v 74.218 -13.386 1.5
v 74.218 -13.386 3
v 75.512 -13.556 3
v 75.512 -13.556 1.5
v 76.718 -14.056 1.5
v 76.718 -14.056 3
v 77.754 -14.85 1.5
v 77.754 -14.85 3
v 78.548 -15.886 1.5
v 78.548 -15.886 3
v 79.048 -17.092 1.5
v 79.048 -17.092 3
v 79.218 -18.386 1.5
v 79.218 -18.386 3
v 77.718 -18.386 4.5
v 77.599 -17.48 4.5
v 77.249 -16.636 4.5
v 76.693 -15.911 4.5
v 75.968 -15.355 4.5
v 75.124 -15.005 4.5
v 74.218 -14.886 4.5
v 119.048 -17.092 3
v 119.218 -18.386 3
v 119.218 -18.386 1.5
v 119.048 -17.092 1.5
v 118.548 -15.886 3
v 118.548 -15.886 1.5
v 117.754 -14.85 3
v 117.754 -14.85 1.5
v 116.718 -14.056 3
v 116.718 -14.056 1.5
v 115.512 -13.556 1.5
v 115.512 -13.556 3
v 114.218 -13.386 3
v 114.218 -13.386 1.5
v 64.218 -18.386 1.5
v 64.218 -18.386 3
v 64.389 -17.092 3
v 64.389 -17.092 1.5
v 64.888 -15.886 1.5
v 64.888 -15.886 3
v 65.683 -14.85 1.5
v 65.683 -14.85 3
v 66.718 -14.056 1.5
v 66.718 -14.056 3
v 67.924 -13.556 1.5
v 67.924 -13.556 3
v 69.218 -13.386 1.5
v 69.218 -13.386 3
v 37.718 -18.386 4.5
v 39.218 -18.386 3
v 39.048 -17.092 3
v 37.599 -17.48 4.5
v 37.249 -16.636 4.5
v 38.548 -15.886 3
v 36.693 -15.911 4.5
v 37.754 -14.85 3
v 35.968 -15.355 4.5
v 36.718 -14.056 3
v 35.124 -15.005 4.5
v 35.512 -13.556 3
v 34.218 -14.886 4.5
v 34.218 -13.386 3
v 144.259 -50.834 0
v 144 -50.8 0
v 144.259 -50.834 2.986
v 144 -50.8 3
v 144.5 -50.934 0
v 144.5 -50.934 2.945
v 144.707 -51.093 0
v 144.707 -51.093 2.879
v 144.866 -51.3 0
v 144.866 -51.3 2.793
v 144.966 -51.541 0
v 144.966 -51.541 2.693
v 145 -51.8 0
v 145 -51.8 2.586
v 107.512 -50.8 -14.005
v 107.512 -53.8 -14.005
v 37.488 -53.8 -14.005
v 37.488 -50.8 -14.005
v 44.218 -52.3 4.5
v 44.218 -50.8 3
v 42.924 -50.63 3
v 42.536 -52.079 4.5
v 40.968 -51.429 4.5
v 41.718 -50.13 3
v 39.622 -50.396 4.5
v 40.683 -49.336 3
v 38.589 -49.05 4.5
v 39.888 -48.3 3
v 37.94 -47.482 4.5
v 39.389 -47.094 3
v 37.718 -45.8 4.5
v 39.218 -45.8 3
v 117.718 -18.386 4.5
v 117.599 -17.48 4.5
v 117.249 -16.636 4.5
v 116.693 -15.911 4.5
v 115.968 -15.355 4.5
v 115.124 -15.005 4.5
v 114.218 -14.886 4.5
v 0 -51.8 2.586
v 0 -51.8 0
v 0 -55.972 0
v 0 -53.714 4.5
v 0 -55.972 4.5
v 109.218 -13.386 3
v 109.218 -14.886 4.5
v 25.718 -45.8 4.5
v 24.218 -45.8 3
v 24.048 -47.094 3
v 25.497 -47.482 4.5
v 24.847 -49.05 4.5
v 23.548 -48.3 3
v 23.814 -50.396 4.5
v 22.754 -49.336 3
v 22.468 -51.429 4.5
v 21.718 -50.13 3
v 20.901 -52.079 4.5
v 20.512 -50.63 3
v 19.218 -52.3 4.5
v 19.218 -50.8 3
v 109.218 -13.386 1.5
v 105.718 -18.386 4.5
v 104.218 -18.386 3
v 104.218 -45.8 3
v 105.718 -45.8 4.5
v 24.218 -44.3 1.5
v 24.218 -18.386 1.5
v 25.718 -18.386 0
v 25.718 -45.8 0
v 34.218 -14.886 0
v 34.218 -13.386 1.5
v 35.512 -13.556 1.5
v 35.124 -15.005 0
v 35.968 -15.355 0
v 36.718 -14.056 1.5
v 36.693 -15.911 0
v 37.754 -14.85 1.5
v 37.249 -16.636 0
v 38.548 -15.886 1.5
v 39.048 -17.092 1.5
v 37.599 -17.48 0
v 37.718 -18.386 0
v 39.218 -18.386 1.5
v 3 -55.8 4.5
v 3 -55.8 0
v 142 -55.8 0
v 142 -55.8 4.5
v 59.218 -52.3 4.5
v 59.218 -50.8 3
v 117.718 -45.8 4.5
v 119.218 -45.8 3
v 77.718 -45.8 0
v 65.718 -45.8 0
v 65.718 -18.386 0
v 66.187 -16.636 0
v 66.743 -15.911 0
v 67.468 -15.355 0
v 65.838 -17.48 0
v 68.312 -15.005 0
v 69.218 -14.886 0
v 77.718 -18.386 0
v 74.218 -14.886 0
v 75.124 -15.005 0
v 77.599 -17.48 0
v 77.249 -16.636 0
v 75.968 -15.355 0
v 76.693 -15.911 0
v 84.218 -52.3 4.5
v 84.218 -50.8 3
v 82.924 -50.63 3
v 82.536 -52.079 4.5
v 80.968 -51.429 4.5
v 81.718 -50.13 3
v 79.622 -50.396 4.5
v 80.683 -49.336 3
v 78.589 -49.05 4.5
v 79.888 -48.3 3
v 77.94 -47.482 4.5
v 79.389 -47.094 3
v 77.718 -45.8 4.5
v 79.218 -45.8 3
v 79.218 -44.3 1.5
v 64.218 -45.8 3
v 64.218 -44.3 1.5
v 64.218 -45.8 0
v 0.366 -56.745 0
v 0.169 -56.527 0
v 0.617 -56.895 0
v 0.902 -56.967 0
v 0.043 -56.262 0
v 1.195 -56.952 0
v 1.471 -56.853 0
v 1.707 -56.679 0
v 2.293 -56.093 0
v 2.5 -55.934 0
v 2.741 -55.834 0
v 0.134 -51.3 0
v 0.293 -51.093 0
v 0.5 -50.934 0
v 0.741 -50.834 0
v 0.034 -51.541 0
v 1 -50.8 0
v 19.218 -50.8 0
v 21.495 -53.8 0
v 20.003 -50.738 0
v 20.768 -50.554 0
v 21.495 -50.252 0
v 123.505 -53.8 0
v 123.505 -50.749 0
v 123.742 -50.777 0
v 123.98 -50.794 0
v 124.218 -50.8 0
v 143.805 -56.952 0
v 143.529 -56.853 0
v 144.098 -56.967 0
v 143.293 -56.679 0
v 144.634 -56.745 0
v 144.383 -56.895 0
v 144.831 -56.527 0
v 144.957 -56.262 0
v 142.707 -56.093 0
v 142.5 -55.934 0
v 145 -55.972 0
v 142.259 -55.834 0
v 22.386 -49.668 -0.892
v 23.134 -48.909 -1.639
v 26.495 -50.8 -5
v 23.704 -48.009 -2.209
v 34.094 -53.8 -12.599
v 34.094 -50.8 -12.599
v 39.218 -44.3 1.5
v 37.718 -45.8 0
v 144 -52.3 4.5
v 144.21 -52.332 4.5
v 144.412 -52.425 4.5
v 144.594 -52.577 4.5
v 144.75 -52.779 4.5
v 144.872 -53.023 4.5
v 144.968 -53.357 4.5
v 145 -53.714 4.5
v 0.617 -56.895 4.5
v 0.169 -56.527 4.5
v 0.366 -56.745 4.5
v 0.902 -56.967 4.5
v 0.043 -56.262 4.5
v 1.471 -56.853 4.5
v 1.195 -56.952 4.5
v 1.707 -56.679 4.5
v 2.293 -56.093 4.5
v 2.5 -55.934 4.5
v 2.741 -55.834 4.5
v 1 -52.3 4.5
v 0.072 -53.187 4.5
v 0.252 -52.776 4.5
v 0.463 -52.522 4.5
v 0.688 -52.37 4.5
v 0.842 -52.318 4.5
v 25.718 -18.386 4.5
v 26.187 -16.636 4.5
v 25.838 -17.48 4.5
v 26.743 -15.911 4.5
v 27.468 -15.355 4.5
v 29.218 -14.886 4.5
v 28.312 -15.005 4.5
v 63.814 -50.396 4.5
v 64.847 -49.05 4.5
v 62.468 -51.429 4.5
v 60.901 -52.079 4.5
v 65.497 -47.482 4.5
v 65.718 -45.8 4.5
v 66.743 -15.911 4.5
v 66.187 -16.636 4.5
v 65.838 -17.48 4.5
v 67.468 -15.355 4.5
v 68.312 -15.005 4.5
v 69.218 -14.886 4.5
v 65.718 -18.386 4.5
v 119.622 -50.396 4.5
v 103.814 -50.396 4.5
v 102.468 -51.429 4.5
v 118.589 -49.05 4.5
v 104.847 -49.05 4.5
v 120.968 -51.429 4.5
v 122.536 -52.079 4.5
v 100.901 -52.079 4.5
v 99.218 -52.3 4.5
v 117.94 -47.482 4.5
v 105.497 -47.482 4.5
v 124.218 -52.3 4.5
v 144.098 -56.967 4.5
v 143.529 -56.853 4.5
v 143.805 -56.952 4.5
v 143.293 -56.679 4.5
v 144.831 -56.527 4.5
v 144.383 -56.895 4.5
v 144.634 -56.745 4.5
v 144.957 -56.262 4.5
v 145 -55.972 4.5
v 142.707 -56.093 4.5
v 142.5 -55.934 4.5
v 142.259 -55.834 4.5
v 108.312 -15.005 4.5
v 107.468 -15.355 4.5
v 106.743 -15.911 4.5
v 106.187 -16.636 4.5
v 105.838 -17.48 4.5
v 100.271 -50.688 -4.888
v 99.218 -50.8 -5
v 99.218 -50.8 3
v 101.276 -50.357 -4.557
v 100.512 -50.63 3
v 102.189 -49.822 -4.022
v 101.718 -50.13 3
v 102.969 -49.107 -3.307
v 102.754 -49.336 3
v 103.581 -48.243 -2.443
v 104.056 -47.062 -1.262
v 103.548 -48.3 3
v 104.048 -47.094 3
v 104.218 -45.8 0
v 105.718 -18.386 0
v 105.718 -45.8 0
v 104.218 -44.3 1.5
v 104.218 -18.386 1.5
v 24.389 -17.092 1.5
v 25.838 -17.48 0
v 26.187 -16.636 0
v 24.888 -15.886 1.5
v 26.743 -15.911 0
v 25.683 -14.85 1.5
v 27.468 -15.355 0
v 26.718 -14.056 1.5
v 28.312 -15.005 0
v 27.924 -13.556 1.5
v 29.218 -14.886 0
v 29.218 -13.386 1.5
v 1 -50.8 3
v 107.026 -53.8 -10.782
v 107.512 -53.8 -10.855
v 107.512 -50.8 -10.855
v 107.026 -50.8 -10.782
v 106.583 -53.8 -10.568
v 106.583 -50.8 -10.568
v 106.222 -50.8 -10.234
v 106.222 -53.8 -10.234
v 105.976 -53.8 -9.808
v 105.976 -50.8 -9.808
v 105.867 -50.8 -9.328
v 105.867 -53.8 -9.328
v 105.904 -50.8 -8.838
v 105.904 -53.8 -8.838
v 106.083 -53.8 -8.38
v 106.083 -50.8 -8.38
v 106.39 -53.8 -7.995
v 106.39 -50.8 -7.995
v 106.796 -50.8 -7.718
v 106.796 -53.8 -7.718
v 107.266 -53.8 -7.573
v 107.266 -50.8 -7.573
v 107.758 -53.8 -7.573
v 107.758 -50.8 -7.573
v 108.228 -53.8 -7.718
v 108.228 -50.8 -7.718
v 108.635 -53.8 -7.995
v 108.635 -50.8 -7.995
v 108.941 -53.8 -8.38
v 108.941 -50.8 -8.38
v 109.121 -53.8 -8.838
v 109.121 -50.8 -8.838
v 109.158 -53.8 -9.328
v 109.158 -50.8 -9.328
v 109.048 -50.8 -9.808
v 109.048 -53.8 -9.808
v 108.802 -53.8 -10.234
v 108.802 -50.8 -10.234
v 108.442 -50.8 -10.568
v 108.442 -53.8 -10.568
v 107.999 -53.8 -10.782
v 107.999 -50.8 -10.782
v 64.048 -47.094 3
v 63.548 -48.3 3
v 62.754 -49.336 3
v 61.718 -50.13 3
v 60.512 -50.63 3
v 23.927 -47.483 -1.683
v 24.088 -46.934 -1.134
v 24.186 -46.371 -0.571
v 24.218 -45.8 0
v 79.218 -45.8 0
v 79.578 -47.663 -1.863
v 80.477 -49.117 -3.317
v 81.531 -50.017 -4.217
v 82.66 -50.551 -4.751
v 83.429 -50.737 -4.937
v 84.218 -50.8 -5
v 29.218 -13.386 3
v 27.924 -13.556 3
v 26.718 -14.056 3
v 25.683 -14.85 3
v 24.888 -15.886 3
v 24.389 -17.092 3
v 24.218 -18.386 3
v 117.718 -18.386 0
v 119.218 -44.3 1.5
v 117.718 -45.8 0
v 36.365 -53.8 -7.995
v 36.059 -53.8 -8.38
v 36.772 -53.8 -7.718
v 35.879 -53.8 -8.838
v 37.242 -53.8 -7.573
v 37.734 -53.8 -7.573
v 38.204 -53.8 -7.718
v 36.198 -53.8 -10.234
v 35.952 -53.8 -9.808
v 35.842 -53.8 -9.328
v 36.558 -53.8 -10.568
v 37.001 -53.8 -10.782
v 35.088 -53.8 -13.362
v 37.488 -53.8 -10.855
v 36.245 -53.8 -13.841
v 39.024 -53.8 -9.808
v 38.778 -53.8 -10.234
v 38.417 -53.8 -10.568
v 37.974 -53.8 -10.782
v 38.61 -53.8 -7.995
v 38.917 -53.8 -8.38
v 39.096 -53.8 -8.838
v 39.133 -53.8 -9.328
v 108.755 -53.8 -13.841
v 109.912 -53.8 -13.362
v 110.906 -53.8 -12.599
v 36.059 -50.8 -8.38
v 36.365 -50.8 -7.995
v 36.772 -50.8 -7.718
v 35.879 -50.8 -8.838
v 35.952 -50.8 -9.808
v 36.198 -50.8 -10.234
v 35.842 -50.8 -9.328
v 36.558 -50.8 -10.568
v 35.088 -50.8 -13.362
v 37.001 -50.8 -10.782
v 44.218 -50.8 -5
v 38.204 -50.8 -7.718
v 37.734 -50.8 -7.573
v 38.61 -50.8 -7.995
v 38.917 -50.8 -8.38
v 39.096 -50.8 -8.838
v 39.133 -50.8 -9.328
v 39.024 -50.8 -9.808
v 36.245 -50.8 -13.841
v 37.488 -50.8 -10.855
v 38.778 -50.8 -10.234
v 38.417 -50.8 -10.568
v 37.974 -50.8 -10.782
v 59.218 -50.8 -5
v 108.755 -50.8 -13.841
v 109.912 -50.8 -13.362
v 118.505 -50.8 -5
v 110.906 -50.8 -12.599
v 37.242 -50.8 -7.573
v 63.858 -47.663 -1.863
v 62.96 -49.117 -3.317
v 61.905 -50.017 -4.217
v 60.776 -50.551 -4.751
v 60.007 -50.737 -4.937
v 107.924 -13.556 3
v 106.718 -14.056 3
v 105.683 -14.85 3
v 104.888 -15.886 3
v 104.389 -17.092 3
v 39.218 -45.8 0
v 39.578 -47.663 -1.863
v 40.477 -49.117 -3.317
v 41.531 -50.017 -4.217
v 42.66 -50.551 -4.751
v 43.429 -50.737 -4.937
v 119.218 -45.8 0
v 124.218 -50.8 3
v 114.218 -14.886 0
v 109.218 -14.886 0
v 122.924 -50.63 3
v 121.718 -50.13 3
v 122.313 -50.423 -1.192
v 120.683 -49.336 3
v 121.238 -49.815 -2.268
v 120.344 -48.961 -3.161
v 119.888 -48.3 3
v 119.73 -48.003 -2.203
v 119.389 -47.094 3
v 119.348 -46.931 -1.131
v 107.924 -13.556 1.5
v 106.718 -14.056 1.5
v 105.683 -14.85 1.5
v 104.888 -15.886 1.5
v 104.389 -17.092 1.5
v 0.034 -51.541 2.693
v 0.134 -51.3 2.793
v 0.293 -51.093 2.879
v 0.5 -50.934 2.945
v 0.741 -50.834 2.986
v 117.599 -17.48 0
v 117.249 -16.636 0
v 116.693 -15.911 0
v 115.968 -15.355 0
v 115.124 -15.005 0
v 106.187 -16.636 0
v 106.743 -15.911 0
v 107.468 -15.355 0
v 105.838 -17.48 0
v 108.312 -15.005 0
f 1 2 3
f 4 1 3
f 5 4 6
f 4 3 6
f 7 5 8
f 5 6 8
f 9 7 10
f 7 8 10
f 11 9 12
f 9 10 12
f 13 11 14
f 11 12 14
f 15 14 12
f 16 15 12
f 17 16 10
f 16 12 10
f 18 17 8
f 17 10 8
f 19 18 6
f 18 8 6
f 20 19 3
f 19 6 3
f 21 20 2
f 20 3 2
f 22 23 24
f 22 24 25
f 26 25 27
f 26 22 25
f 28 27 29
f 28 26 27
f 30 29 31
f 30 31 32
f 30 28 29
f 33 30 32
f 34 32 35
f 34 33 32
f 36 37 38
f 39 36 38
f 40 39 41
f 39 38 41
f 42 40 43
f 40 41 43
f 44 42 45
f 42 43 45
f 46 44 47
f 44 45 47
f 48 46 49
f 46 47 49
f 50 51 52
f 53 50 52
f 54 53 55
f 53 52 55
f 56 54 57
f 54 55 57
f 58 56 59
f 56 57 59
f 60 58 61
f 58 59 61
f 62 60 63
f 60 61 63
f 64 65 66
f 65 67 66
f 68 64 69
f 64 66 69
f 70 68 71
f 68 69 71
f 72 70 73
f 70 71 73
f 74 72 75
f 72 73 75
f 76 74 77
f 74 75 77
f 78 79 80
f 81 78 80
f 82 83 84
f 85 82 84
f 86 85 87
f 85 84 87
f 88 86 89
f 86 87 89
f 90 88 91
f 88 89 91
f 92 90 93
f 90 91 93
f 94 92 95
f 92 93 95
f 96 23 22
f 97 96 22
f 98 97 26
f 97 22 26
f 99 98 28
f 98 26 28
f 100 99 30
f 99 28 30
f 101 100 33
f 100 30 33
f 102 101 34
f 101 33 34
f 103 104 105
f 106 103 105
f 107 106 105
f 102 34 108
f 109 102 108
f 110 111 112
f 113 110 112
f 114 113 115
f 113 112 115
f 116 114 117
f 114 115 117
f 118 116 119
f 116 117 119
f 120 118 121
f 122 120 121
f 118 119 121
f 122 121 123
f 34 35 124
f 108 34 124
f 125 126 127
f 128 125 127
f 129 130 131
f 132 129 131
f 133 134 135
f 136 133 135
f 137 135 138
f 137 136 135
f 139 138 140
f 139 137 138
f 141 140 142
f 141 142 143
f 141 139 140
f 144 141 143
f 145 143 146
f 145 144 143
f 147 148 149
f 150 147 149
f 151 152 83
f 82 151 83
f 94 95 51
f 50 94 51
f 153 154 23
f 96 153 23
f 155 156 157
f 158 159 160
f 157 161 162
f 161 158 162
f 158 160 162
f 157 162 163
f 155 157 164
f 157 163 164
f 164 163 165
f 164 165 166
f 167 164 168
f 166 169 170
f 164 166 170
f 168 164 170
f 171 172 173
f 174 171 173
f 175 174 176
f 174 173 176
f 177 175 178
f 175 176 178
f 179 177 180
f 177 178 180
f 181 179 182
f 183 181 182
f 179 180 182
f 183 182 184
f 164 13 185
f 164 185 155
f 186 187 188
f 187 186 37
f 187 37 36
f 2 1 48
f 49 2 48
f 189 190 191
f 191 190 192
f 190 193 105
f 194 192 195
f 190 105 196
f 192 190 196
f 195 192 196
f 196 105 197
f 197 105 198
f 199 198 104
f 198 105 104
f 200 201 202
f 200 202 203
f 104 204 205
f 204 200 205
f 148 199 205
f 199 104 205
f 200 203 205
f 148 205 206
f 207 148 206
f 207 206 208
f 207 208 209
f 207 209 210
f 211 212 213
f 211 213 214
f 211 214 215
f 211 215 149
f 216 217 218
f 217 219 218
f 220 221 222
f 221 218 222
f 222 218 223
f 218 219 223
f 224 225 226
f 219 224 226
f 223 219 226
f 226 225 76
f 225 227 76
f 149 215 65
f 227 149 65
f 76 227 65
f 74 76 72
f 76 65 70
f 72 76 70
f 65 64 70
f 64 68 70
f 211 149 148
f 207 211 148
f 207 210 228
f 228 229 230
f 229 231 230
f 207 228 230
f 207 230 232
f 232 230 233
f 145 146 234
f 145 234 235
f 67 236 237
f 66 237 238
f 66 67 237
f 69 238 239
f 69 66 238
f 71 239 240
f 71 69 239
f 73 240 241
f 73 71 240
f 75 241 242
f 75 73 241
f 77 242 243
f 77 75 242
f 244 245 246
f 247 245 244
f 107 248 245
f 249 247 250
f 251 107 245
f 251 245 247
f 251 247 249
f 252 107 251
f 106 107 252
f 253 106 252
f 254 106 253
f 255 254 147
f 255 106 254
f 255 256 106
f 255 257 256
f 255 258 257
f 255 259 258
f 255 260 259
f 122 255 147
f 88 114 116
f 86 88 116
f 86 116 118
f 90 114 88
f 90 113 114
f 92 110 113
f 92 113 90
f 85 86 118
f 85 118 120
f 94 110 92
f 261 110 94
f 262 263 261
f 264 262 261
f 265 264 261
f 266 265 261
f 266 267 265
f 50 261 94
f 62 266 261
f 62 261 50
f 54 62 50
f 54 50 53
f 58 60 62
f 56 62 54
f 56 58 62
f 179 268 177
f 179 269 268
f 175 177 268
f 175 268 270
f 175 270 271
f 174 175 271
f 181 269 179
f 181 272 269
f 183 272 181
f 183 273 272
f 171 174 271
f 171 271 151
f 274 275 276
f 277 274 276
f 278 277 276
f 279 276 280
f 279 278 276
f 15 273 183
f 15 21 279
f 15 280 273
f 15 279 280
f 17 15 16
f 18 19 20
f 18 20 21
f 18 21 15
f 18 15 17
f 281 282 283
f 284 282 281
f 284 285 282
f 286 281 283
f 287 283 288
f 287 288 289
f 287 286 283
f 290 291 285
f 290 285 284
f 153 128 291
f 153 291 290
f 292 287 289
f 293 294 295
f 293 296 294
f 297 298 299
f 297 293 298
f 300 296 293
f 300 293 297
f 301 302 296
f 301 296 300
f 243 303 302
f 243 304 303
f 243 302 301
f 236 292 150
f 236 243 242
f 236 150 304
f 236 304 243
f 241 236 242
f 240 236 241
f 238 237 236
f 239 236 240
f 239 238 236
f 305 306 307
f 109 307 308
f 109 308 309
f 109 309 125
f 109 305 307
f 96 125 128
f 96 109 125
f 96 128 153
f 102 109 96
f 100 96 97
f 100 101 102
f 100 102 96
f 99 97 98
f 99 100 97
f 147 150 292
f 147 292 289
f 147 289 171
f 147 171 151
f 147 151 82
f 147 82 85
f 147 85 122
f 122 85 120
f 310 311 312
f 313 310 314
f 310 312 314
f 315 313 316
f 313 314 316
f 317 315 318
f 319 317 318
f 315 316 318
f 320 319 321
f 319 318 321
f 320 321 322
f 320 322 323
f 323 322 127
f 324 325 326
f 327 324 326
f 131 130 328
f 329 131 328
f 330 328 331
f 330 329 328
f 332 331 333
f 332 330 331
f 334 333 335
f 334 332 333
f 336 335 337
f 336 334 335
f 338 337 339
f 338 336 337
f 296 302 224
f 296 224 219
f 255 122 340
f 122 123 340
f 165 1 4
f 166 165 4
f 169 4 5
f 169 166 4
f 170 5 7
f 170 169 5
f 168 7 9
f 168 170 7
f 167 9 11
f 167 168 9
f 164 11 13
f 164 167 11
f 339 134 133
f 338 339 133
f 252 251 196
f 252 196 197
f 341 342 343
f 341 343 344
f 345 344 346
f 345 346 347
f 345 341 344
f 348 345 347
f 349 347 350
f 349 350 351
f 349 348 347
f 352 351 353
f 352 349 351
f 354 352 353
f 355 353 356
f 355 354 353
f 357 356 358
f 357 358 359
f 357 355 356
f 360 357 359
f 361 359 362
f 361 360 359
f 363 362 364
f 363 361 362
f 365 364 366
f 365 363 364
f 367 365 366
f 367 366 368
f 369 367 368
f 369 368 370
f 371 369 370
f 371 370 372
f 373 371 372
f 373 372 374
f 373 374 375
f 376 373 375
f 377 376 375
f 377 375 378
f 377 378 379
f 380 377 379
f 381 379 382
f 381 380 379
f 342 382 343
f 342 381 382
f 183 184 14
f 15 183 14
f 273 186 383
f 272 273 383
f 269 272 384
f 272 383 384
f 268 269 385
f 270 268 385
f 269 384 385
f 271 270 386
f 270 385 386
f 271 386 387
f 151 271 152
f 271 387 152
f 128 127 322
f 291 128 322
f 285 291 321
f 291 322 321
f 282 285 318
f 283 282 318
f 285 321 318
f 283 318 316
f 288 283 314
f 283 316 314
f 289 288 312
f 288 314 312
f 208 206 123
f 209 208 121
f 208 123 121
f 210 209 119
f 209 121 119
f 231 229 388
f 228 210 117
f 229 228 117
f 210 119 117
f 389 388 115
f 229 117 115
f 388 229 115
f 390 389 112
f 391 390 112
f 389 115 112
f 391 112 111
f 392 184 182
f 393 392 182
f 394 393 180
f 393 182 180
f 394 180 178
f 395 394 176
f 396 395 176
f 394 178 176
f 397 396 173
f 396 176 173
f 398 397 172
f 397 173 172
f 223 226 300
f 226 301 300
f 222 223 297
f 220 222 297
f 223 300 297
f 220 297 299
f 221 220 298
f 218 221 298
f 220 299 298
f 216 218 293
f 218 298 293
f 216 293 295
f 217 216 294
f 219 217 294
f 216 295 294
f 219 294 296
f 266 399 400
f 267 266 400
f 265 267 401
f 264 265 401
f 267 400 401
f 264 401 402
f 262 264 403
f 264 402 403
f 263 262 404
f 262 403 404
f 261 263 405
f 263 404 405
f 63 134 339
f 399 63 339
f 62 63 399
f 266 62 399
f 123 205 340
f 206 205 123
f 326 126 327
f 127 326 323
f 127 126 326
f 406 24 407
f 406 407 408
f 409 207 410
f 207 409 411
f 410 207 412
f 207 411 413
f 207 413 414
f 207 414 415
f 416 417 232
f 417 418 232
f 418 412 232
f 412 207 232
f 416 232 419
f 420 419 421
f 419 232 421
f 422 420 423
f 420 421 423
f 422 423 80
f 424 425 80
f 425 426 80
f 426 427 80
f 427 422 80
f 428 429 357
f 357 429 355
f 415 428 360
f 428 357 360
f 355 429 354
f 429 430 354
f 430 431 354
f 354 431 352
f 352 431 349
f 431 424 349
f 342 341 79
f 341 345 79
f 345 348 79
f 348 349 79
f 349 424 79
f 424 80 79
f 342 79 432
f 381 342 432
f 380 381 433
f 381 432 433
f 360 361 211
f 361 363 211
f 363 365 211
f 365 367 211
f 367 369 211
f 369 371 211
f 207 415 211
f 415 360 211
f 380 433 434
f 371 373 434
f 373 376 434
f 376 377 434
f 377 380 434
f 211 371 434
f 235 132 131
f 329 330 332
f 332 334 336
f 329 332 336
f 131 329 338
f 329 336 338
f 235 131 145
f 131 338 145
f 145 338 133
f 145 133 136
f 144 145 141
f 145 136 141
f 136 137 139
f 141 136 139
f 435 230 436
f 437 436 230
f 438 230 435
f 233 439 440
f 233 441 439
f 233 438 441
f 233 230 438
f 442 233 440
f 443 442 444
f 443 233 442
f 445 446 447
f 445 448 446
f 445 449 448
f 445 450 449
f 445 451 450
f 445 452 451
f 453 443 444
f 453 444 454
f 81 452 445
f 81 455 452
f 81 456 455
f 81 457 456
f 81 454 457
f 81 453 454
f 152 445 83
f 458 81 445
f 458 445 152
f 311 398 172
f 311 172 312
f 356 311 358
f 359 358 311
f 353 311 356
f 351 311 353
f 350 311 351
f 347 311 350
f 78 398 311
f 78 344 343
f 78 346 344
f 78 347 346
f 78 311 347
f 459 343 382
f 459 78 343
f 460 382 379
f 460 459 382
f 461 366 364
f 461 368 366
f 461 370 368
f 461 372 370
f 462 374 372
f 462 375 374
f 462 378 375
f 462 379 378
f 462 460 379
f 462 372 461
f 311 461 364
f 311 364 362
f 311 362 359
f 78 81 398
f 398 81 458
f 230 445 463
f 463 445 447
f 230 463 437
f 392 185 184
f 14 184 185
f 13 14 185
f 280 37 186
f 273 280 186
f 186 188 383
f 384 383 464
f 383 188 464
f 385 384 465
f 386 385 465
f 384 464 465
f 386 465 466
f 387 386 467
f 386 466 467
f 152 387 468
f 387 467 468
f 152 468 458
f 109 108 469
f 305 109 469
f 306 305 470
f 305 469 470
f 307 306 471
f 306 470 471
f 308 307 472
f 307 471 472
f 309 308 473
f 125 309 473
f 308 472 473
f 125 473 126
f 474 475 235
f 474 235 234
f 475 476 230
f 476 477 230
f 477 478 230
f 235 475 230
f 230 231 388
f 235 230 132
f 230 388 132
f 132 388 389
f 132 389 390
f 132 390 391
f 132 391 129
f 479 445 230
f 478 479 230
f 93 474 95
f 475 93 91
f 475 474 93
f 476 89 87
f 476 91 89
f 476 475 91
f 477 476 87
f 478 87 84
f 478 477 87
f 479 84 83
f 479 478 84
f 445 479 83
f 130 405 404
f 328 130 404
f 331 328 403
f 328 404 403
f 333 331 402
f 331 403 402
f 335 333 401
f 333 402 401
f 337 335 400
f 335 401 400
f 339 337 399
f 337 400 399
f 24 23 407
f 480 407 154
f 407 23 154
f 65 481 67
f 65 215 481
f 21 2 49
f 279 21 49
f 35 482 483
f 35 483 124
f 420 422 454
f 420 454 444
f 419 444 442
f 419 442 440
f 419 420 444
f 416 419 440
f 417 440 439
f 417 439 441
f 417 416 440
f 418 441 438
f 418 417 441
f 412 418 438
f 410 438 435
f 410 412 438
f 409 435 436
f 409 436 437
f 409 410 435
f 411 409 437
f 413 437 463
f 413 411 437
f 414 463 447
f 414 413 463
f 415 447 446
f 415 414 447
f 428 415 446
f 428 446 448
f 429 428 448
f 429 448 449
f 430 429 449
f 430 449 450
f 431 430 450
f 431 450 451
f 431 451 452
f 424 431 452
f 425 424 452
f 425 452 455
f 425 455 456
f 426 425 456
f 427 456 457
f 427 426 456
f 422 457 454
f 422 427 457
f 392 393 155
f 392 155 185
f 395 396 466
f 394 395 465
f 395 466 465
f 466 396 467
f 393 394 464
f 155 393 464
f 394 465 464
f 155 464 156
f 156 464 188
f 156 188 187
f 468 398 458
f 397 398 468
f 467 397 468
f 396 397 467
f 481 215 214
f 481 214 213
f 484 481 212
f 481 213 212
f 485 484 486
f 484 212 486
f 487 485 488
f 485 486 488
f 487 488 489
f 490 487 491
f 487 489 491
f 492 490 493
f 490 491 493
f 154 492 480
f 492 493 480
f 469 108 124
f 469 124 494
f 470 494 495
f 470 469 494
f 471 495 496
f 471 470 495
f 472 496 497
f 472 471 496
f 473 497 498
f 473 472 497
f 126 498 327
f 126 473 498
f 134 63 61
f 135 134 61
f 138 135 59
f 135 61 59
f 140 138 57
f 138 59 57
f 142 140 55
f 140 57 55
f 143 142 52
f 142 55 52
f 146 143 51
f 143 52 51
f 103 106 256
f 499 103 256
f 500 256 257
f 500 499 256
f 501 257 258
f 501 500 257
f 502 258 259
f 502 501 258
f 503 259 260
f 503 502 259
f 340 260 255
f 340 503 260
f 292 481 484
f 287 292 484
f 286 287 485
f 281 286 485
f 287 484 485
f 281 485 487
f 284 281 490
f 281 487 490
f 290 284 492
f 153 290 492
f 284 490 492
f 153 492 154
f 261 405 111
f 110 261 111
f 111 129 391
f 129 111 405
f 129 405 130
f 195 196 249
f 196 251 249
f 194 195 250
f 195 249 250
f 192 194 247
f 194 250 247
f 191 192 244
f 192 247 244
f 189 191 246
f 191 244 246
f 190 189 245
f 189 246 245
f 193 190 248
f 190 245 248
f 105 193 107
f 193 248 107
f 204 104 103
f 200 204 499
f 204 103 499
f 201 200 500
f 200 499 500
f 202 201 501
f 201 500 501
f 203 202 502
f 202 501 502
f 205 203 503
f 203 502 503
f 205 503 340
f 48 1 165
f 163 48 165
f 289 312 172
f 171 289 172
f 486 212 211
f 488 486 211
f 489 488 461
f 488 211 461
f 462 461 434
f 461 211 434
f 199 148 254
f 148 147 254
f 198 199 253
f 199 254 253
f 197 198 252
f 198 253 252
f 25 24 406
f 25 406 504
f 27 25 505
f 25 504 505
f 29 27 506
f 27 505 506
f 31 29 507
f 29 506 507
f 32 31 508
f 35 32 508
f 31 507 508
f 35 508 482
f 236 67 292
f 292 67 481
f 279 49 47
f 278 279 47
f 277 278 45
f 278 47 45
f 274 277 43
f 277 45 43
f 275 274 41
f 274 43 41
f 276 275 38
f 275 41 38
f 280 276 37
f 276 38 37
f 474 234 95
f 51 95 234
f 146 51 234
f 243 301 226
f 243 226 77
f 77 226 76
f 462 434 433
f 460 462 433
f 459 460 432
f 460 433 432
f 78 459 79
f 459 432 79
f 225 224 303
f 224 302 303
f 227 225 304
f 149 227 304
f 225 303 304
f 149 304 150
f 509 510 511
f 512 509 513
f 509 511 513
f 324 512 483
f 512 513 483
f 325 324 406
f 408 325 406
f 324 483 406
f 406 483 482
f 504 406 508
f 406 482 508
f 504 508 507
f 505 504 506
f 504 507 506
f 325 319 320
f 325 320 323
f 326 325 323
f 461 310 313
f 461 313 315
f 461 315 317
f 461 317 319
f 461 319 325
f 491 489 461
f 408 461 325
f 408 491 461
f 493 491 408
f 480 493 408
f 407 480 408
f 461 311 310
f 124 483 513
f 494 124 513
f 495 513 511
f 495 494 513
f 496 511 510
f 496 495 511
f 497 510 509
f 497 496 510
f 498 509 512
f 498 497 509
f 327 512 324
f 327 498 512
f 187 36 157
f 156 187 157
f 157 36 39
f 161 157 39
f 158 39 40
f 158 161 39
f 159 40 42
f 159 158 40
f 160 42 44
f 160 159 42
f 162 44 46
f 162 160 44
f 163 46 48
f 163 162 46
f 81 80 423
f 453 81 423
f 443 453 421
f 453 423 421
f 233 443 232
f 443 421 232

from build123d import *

# Parameters (mm, degrees)
BOSS_EXTRUDE1_DEPTH = 4.5
SKETCH2_R           = 1.6500000000000021
BOSS_EXTRUDE2_DEPTH = 3
CHAMFER1_SIZE       = 5
FILLET1_R           = 5
FILLET2_R           = 5
CHAMFER2_SIZE       = 1.5
CHAMFER3_SIZE       = 1.5
FILLET3_R           = 1


with BuildPart() as part:
    # Sketch1 → Boss-Extrude1 (new body)
    with BuildSketch(Plane.XY):
        Polygon((119.21826692136499, -13.385786437626857), (104.21826692136499, -13.38578643762686), (104.21826692136499, -50.8), (79.218266921365, -50.8), (79.218266921365, -13.385786437626857), (64.218266921365, -13.38578643762686), (64.218266921365, -50.8), (39.218266921365, -50.8), (39.21826692136499, -13.385786437627136), (24.218266921364993, -13.38578643762714), (24.21826692136499, -50.8), (0, -50.79999999999999), (0, -58.38578643762687), (2.5857864376269135, -55.8), (142.4142135623731, -55.8), (145, -58.38578643762691), (145, -50.8), (119.21826692136499, -50.8), align=None)
    extrude(amount=BOSS_EXTRUDE1_DEPTH)

    # Sketch2 → Boss-Extrude2 (add)
    with BuildSketch(Plane(origin=(0, -53.8, 0), x_dir=(1, 0, 0), z_dir=(0, 1, 0))):
        with BuildLine():
            Line((123.50544023729859, 2.968e-14), (110.90639087969068, 12.59904935760797))
            ThreePointArc((110.90639087969068, 12.59904935760797), (109.34915880534766, 13.639558563966734), (107.5122783299952, 14.004936807912568))
            Line((107.5122783299952, 14.004936807912568), (37.48772167000479, 14.004936807912571))
            ThreePointArc((37.48772167000479, 14.004936807912571), (35.65084119465232, 13.639558563966755), (34.093609120309296, 12.599049357607985))
            Line((34.093609120309296, 12.599049357607985), (21.4945597627013, -1.69e-15))
            Line((21.4945597627013, -1.69e-15), (123.50544023729859, 2.968e-14))
        make_face()
        with Locations(Location((37.48772167000473, 9.204936807912581, 0), (0, 0, 90))):
            Circle(SKETCH2_R, mode=Mode.SUBTRACT)
        with Locations(Location((107.51227832999525, 9.204936807912581, 0), (0, 0, 90))):
            Circle(SKETCH2_R, mode=Mode.SUBTRACT)
    extrude(amount=BOSS_EXTRUDE2_DEPTH)

    # Chamfer1
    # the kernel refuses this chamfer: 5 mm, written as the material it adds along each edge
    with BuildSketch(Plane(origin=(24.218266921364993, -50.8, 8.6e-16), x_dir=(0, -0.02749587661059184, -0.9996219169112965), z_dir=(1, 0, -3.1e-16))) as chamfer1_piece_1_section:
        Polygon((CHAMFER1_SIZE * 0.999621916911, CHAMFER1_SIZE * 0.0274958766106), (-CHAMFER1_SIZE * 0.0274958766106, CHAMFER1_SIZE * 0.999621916911), (0, 0), align=None)
    chamfer1_piece_1 = extrude(amount=15.000000000000007, mode=Mode.PRIVATE)
    chamfer1_piece_1 = split(chamfer1_piece_1, bisect_by=Plane(origin=(27.458586857581327, -49.136179349739656, -5.964027094880023), z_dir=(0.7071067811865472, 0, 0.7071067811865478)), keep=Keep.TOP, mode=Mode.PRIVATE)
    add(chamfer1_piece_1)
    with BuildSketch(Plane(origin=(64.218266921365, -50.8, -1.145e-14), x_dir=(0, -0.02749587661058908, -0.9996219169112968), z_dir=(1, 0, -3.1e-16))) as chamfer1_piece_2:
        Polygon((CHAMFER1_SIZE * 0.999621916911, CHAMFER1_SIZE * 0.0274958766106), (-CHAMFER1_SIZE * 0.0274958766106, CHAMFER1_SIZE * 0.999621916911), (0, 0), align=None)
    extrude(amount=15)
    with BuildSketch(Plane(origin=(104.21826692136499, -50.8, -2.375e-14), x_dir=(0, 0.9996219169112965, 0.027495876610591035), z_dir=(1, 0, -3.1e-16))) as chamfer1_piece_3_section:
        Polygon((CHAMFER1_SIZE * 0.999621916911, -CHAMFER1_SIZE * 0.0274958766106), (-CHAMFER1_SIZE * 0.0274958766106, -CHAMFER1_SIZE * 0.999621916911), (0, 0), align=None)
    chamfer1_piece_3 = extrude(amount=15, mode=Mode.PRIVATE)
    chamfer1_piece_3 = split(chamfer1_piece_3, bisect_by=Plane(origin=(116.78603436653776, -49.14998540496001, -6.719405870760873), z_dir=(-0.7071067811865483, 0, 0.7071067811865467)), keep=Keep.TOP, mode=Mode.PRIVATE)
    add(chamfer1_piece_3)

    # Fillet1
    fillet1_edges = [part.edges().sort_by_distance(p)[0] for p in [
        (39.218266921365, -50.80000000000099, -0.24999999999926015),
        (64.218266921365, -50.80000000000099, -0.24999999999926015),
        (79.218266921365, -50.80000000000099, -0.24999999999926015),
        (104.218266921365, -50.799999999999, -0.24999999999926015),
        (119.21826692136499, -50.799999999999145, 0.10641334203299913),
        (24.218266921364997, -50.80000000000054, 0.8881464206679999),
    ]]
    fillet(fillet1_edges, radius=FILLET1_R)

    # Fillet2
    fillet2_edges = [part.edges().sort_by_distance(p)[0] for p in [
        (24.218266921364993, -13.38578643762714, 2.25),
        (39.21826692136499, -13.385786437627136, 2.25),
        (64.218266921365, -13.38578643762686, 2.25),
        (79.218266921365, -13.385786437626857, 2.25),
        (104.21826692136499, -13.38578643762686, 2.25),
        (119.21826692136499, -13.385786437626855, 2.25),
    ]]
    fillet(fillet2_edges, radius=FILLET2_R)

    # Chamfer2
    # the kernel refuses this chamfer: 1.5 mm, written as the material it takes off along each edge
    with BuildSketch(Plane(origin=(114.218266921365, -13.385786437626859, 0), x_dir=(0, -0.9996219169112968, -0.02749587661058636), z_dir=(-1, -2.4e-16, 0))) as chamfer2_piece_1:
        Polygon((CHAMFER2_SIZE * 0.999621916911, CHAMFER2_SIZE * 0.0274958766106), (-CHAMFER2_SIZE * 0.0274958766106, CHAMFER2_SIZE * 0.999621916911), (0, 0), align=None)
    extrude(amount=5, mode=Mode.SUBTRACT)
    with BuildSketch(Plane(origin=(119.218266921365, -49.65752448195035, 0), x_dir=(0.02749587661058217, 0, 0.9996219169112969), z_dir=(0, 1, 0))) as chamfer2_piece_2_section:
        Polygon((CHAMFER2_SIZE * 0.999621916911, -CHAMFER2_SIZE * 0.0274958766106), (-CHAMFER2_SIZE * 0.0274958766106, -CHAMFER2_SIZE * 0.999621916911), (0, 0), align=None)
    chamfer2_piece_2 = extrude(amount=31.27173804432349, mode=Mode.PRIVATE)
    chamfer2_piece_2 = split(chamfer2_piece_2, bisect_by=Plane(origin=(118.72073896252428, -38.57940955340098, 7.220590446608273), z_dir=(0, 0.7071067811868302, -0.7071067811862648)), keep=Keep.TOP, mode=Mode.PRIVATE)
    add(chamfer2_piece_2, mode=Mode.SUBTRACT)
    with BuildSketch(Plane(origin=(104.21826692136499, -18.38578643762686, 0), x_dir=(0.9996219169112968, 0, -0.02749587661058662), z_dir=(0, -1, 0))) as chamfer2_piece_3_section:
        Polygon((CHAMFER2_SIZE * 0.999621916911, CHAMFER2_SIZE * 0.0274958766106), (-CHAMFER2_SIZE * 0.0274958766106, CHAMFER2_SIZE * 0.999621916911), (0, 0), align=None)
    chamfer2_piece_3 = extrude(amount=31.27173804432348, mode=Mode.PRIVATE)
    chamfer2_piece_3 = split(chamfer2_piece_3, bisect_by=Plane(origin=(104.71579488020573, -38.579409553400986, 7.220590446608265), z_dir=(0, 0.7071067811868302, -0.7071067811862648)), keep=Keep.TOP, mode=Mode.PRIVATE)
    add(chamfer2_piece_3, mode=Mode.SUBTRACT)
    with BuildSketch(Plane(origin=(109.218266921365, -18.385786437626862, 0), x_dir=(0, 1, 0), z_dir=(1, 0, 0))) as chamfer2_piece_4:
        Polygon((5 - CHAMFER2_SIZE, 0), (5, CHAMFER2_SIZE), (5, 0), align=None)
    revolve(axis=Axis((109.218266921365, -18.385786437626862, 0), (0, 0, 1)), revolution_arc=90, mode=Mode.SUBTRACT)
    with BuildSketch(Plane(origin=(114.218266921365, -18.385786437626855, 0), x_dir=(1, 0, 0), z_dir=(0, -1, 0))) as chamfer2_piece_5:
        Polygon((5, CHAMFER2_SIZE), (5 - CHAMFER2_SIZE, 0), (5, 0), align=None)
    revolve(axis=Axis((114.218266921365, -18.385786437626855, 0), (0, 0, 1)), revolution_arc=90, mode=Mode.SUBTRACT)
    with BuildSketch(Plane(origin=(74.218266921365, -13.385786437626859, 0), x_dir=(0, 0.027495876610586778, 0.9996219169112968), z_dir=(-1, -2.4e-16, 0))) as chamfer2_piece_6:
        Polygon((CHAMFER2_SIZE * 0.999621916911, -CHAMFER2_SIZE * 0.0274958766106), (-CHAMFER2_SIZE * 0.0274958766106, -CHAMFER2_SIZE * 0.999621916911), (0, 0), align=None)
    extrude(amount=5, mode=Mode.SUBTRACT)
    with BuildSketch(Plane(origin=(79.218266921365, -49.65752448195035, 0), x_dir=(0.027495876610582157, 0, 0.9996219169112969), z_dir=(0, 1, 0))) as chamfer2_piece_7_section:
        Polygon((CHAMFER2_SIZE * 0.999621916911, -CHAMFER2_SIZE * 0.0274958766106), (-CHAMFER2_SIZE * 0.0274958766106, -CHAMFER2_SIZE * 0.999621916911), (0, 0), align=None)
    chamfer2_piece_7 = extrude(amount=31.27173804432349, mode=Mode.PRIVATE)
    chamfer2_piece_7 = split(chamfer2_piece_7, bisect_by=Plane(origin=(78.72073896252427, -38.579409553386625, 7.220590446607076), z_dir=(0, 0.7071067811862648, -0.7071067811868302)), keep=Keep.TOP, mode=Mode.PRIVATE)
    add(chamfer2_piece_7, mode=Mode.SUBTRACT)
    with BuildSketch(Plane(origin=(64.218266921365, -18.38578643762686, 0), x_dir=(-0.02749587661058215, 0, 0.9996219169112969), z_dir=(0, -1, 0))) as chamfer2_piece_8_section:
        Polygon((CHAMFER2_SIZE * 0.999621916911, -CHAMFER2_SIZE * 0.0274958766106), (-CHAMFER2_SIZE * 0.0274958766106, -CHAMFER2_SIZE * 0.999621916911), (0, 0), align=None)
    chamfer2_piece_8 = extrude(amount=31.27173804432348, mode=Mode.PRIVATE)
    chamfer2_piece_8 = split(chamfer2_piece_8, bisect_by=Plane(origin=(64.71579488020572, -38.57940955338663, 7.220590446607069), z_dir=(0, 0.7071067811862648, -0.7071067811868302)), keep=Keep.TOP, mode=Mode.PRIVATE)
    add(chamfer2_piece_8, mode=Mode.SUBTRACT)
    with BuildSketch(Plane(origin=(69.218266921365, -18.385786437626862, 0), x_dir=(-1, 0, 0), z_dir=(0, -1, 0))) as chamfer2_piece_9:
        Polygon((5, -CHAMFER2_SIZE), (5 - CHAMFER2_SIZE, 0), (5, 0), align=None)
    revolve(axis=Axis((69.218266921365, -18.385786437626862, 0), (0, 0, -1)), revolution_arc=90, mode=Mode.SUBTRACT)
    with BuildSketch(Plane(origin=(74.218266921365, -18.385786437626855, 0), x_dir=(0, 1, 0), z_dir=(-1, 0, 0))) as chamfer2_piece_10:
        Polygon((5, -CHAMFER2_SIZE), (5 - CHAMFER2_SIZE, 0), (5, 0), align=None)
    revolve(axis=Axis((74.218266921365, -18.385786437626855, 0), (0, 0, -1)), revolution_arc=90, mode=Mode.SUBTRACT)
    with BuildSketch(Plane(origin=(34.218266921365, -13.385786437627138, 0), x_dir=(0, 0.027495876610586778, 0.9996219169112968), z_dir=(-1, -2.4e-16, 0))) as chamfer2_piece_11:
        Polygon((CHAMFER2_SIZE * 0.999621916911, -CHAMFER2_SIZE * 0.0274958766106), (-CHAMFER2_SIZE * 0.0274958766106, -CHAMFER2_SIZE * 0.999621916911), (0, 0), align=None)
    extrude(amount=5, mode=Mode.SUBTRACT)
    with BuildSketch(Plane(origin=(39.218266921365, -49.65752448195034, 0), x_dir=(0.027495876610586757, 0, 0.9996219169112968), z_dir=(0, 1, 0))) as chamfer2_piece_12_section:
        Polygon((CHAMFER2_SIZE * 0.999621916911, -CHAMFER2_SIZE * 0.0274958766106), (-CHAMFER2_SIZE * 0.0274958766106, -CHAMFER2_SIZE * 0.999621916911), (0, 0), align=None)
    chamfer2_piece_12 = extrude(amount=31.2717380443232, mode=Mode.PRIVATE)
    chamfer2_piece_12 = split(chamfer2_piece_12, bisect_by=Plane(origin=(38.72073896252428, -38.579409553386704, 7.220590446606996), z_dir=(0, 0.7071067811862648, -0.7071067811868302)), keep=Keep.TOP, mode=Mode.PRIVATE)
    add(chamfer2_piece_12, mode=Mode.SUBTRACT)
    with BuildSketch(Plane(origin=(24.218266921364993, -18.38578643762714, 0), x_dir=(-0.027495876610582153, 0, 0.9996219169112969), z_dir=(-9e-17, -1, 0))) as chamfer2_piece_13_section:
        Polygon((CHAMFER2_SIZE * 0.999621916911, -CHAMFER2_SIZE * 0.0274958766106), (-CHAMFER2_SIZE * 0.0274958766106, -CHAMFER2_SIZE * 0.999621916911), (0, 0), align=None)
    chamfer2_piece_13 = extrude(amount=31.271738044323207, mode=Mode.PRIVATE)
    chamfer2_piece_13 = split(chamfer2_piece_13, bisect_by=Plane(origin=(24.71579488020572, -38.57940955338671, 7.220590446606995), z_dir=(0, 0.7071067811862648, -0.7071067811868302)), keep=Keep.TOP, mode=Mode.PRIVATE)
    add(chamfer2_piece_13, mode=Mode.SUBTRACT)
    with BuildSketch(Plane(origin=(29.218266921365, -18.38578643762714, 0), x_dir=(-1, 0, 0), z_dir=(0, -1, 0))) as chamfer2_piece_14:
        Polygon((5, -CHAMFER2_SIZE), (5 - CHAMFER2_SIZE, 0), (5, 0), align=None)
    revolve(axis=Axis((29.218266921365, -18.38578643762714, 0), (0, 0, -1)), revolution_arc=90, mode=Mode.SUBTRACT)
    with BuildSketch(Plane(origin=(34.218266921365, -18.38578643762714, 0), x_dir=(0, 1, 0), z_dir=(-1, 0, 0))) as chamfer2_piece_15:
        Polygon((5, -CHAMFER2_SIZE), (5 - CHAMFER2_SIZE, 0), (5, 0), align=None)
    revolve(axis=Axis((34.218266921365, -18.38578643762714, 0), (0, 0, -1)), revolution_arc=90, mode=Mode.SUBTRACT)

    # Chamfer3
    chamfer3_edges = [part.edges().sort_by_distance(p)[0] for p in [
        (51.718266921365, -50.8, 4.5),
        (9.609133460682495, -50.79999999999999, 4.5),
        (40.68273301543226, -49.335533905932756, 4.500000000000743),
        (22.75380082729773, -49.335533905931676, 4.500000000000536),
        (62.75380082729774, -49.33553390593275, 4.500000000000743),
        (80.68273301543226, -49.33553390593075, 4.500000000000743),
        (120.68273301543226, -49.335533905932735, 4.4999999999993054),
        (102.75380082729772, -49.33553390593474, 4.499999999999262),
        (111.718266921365, -13.385786437626859, 4.5),
        (119.21826692136499, -32.09289321881342, 4.5),
        (24.218266921364993, -32.09289321881304, 4.5),
        (104.21826692136499, -32.09289321881443, 4.5),
        (79.218266921365, -32.092893218812435, 4.5),
        (71.718266921365, -13.385786437626859, 4.5),
        (64.218266921365, -32.09289321881344, 4.5),
        (39.21826692136499, -32.09289321881358, 4.5),
        (31.718266921365, -13.385786437627138, 4.5),
        (25.682733015432262, -14.850252531694402, 4.5),
        (37.75380082729774, -14.850252531694402, 4.5),
        (65.68273301543226, -14.850252531694125, 4.5),
        (77.75380082729774, -14.850252531694117, 4.5),
        (105.68273301543226, -14.850252531694125, 4.5),
        (117.75380082729774, -14.850252531694117, 4.5),
        (134.6091334606825, -50.79999999999999, 4.5),
    ]]
    chamfer(chamfer3_edges, length=CHAMFER3_SIZE)

    # Fillet3
    fillet3_edges = [part.edges().sort_by_distance(p)[0] for p in [
        (145, -58.38578643762691, 2.25),
        (142.4142135623731, -55.8, 2.25),
        (2.5857864376269135, -55.8, 2.25),
        (0, -58.38578643762687, 2.25),
        (0, -50.8, 1.4999999999999982),
        (-1.78e-15, -51.55000000000001, 3.749999999999994),
        (145, -50.8, 1.4999999999999996),
        (145, -51.54999999999999, 3.749999999999999),
    ]]
    fillet(fillet3_edges, radius=FILLET3_R)


solid = part.part
